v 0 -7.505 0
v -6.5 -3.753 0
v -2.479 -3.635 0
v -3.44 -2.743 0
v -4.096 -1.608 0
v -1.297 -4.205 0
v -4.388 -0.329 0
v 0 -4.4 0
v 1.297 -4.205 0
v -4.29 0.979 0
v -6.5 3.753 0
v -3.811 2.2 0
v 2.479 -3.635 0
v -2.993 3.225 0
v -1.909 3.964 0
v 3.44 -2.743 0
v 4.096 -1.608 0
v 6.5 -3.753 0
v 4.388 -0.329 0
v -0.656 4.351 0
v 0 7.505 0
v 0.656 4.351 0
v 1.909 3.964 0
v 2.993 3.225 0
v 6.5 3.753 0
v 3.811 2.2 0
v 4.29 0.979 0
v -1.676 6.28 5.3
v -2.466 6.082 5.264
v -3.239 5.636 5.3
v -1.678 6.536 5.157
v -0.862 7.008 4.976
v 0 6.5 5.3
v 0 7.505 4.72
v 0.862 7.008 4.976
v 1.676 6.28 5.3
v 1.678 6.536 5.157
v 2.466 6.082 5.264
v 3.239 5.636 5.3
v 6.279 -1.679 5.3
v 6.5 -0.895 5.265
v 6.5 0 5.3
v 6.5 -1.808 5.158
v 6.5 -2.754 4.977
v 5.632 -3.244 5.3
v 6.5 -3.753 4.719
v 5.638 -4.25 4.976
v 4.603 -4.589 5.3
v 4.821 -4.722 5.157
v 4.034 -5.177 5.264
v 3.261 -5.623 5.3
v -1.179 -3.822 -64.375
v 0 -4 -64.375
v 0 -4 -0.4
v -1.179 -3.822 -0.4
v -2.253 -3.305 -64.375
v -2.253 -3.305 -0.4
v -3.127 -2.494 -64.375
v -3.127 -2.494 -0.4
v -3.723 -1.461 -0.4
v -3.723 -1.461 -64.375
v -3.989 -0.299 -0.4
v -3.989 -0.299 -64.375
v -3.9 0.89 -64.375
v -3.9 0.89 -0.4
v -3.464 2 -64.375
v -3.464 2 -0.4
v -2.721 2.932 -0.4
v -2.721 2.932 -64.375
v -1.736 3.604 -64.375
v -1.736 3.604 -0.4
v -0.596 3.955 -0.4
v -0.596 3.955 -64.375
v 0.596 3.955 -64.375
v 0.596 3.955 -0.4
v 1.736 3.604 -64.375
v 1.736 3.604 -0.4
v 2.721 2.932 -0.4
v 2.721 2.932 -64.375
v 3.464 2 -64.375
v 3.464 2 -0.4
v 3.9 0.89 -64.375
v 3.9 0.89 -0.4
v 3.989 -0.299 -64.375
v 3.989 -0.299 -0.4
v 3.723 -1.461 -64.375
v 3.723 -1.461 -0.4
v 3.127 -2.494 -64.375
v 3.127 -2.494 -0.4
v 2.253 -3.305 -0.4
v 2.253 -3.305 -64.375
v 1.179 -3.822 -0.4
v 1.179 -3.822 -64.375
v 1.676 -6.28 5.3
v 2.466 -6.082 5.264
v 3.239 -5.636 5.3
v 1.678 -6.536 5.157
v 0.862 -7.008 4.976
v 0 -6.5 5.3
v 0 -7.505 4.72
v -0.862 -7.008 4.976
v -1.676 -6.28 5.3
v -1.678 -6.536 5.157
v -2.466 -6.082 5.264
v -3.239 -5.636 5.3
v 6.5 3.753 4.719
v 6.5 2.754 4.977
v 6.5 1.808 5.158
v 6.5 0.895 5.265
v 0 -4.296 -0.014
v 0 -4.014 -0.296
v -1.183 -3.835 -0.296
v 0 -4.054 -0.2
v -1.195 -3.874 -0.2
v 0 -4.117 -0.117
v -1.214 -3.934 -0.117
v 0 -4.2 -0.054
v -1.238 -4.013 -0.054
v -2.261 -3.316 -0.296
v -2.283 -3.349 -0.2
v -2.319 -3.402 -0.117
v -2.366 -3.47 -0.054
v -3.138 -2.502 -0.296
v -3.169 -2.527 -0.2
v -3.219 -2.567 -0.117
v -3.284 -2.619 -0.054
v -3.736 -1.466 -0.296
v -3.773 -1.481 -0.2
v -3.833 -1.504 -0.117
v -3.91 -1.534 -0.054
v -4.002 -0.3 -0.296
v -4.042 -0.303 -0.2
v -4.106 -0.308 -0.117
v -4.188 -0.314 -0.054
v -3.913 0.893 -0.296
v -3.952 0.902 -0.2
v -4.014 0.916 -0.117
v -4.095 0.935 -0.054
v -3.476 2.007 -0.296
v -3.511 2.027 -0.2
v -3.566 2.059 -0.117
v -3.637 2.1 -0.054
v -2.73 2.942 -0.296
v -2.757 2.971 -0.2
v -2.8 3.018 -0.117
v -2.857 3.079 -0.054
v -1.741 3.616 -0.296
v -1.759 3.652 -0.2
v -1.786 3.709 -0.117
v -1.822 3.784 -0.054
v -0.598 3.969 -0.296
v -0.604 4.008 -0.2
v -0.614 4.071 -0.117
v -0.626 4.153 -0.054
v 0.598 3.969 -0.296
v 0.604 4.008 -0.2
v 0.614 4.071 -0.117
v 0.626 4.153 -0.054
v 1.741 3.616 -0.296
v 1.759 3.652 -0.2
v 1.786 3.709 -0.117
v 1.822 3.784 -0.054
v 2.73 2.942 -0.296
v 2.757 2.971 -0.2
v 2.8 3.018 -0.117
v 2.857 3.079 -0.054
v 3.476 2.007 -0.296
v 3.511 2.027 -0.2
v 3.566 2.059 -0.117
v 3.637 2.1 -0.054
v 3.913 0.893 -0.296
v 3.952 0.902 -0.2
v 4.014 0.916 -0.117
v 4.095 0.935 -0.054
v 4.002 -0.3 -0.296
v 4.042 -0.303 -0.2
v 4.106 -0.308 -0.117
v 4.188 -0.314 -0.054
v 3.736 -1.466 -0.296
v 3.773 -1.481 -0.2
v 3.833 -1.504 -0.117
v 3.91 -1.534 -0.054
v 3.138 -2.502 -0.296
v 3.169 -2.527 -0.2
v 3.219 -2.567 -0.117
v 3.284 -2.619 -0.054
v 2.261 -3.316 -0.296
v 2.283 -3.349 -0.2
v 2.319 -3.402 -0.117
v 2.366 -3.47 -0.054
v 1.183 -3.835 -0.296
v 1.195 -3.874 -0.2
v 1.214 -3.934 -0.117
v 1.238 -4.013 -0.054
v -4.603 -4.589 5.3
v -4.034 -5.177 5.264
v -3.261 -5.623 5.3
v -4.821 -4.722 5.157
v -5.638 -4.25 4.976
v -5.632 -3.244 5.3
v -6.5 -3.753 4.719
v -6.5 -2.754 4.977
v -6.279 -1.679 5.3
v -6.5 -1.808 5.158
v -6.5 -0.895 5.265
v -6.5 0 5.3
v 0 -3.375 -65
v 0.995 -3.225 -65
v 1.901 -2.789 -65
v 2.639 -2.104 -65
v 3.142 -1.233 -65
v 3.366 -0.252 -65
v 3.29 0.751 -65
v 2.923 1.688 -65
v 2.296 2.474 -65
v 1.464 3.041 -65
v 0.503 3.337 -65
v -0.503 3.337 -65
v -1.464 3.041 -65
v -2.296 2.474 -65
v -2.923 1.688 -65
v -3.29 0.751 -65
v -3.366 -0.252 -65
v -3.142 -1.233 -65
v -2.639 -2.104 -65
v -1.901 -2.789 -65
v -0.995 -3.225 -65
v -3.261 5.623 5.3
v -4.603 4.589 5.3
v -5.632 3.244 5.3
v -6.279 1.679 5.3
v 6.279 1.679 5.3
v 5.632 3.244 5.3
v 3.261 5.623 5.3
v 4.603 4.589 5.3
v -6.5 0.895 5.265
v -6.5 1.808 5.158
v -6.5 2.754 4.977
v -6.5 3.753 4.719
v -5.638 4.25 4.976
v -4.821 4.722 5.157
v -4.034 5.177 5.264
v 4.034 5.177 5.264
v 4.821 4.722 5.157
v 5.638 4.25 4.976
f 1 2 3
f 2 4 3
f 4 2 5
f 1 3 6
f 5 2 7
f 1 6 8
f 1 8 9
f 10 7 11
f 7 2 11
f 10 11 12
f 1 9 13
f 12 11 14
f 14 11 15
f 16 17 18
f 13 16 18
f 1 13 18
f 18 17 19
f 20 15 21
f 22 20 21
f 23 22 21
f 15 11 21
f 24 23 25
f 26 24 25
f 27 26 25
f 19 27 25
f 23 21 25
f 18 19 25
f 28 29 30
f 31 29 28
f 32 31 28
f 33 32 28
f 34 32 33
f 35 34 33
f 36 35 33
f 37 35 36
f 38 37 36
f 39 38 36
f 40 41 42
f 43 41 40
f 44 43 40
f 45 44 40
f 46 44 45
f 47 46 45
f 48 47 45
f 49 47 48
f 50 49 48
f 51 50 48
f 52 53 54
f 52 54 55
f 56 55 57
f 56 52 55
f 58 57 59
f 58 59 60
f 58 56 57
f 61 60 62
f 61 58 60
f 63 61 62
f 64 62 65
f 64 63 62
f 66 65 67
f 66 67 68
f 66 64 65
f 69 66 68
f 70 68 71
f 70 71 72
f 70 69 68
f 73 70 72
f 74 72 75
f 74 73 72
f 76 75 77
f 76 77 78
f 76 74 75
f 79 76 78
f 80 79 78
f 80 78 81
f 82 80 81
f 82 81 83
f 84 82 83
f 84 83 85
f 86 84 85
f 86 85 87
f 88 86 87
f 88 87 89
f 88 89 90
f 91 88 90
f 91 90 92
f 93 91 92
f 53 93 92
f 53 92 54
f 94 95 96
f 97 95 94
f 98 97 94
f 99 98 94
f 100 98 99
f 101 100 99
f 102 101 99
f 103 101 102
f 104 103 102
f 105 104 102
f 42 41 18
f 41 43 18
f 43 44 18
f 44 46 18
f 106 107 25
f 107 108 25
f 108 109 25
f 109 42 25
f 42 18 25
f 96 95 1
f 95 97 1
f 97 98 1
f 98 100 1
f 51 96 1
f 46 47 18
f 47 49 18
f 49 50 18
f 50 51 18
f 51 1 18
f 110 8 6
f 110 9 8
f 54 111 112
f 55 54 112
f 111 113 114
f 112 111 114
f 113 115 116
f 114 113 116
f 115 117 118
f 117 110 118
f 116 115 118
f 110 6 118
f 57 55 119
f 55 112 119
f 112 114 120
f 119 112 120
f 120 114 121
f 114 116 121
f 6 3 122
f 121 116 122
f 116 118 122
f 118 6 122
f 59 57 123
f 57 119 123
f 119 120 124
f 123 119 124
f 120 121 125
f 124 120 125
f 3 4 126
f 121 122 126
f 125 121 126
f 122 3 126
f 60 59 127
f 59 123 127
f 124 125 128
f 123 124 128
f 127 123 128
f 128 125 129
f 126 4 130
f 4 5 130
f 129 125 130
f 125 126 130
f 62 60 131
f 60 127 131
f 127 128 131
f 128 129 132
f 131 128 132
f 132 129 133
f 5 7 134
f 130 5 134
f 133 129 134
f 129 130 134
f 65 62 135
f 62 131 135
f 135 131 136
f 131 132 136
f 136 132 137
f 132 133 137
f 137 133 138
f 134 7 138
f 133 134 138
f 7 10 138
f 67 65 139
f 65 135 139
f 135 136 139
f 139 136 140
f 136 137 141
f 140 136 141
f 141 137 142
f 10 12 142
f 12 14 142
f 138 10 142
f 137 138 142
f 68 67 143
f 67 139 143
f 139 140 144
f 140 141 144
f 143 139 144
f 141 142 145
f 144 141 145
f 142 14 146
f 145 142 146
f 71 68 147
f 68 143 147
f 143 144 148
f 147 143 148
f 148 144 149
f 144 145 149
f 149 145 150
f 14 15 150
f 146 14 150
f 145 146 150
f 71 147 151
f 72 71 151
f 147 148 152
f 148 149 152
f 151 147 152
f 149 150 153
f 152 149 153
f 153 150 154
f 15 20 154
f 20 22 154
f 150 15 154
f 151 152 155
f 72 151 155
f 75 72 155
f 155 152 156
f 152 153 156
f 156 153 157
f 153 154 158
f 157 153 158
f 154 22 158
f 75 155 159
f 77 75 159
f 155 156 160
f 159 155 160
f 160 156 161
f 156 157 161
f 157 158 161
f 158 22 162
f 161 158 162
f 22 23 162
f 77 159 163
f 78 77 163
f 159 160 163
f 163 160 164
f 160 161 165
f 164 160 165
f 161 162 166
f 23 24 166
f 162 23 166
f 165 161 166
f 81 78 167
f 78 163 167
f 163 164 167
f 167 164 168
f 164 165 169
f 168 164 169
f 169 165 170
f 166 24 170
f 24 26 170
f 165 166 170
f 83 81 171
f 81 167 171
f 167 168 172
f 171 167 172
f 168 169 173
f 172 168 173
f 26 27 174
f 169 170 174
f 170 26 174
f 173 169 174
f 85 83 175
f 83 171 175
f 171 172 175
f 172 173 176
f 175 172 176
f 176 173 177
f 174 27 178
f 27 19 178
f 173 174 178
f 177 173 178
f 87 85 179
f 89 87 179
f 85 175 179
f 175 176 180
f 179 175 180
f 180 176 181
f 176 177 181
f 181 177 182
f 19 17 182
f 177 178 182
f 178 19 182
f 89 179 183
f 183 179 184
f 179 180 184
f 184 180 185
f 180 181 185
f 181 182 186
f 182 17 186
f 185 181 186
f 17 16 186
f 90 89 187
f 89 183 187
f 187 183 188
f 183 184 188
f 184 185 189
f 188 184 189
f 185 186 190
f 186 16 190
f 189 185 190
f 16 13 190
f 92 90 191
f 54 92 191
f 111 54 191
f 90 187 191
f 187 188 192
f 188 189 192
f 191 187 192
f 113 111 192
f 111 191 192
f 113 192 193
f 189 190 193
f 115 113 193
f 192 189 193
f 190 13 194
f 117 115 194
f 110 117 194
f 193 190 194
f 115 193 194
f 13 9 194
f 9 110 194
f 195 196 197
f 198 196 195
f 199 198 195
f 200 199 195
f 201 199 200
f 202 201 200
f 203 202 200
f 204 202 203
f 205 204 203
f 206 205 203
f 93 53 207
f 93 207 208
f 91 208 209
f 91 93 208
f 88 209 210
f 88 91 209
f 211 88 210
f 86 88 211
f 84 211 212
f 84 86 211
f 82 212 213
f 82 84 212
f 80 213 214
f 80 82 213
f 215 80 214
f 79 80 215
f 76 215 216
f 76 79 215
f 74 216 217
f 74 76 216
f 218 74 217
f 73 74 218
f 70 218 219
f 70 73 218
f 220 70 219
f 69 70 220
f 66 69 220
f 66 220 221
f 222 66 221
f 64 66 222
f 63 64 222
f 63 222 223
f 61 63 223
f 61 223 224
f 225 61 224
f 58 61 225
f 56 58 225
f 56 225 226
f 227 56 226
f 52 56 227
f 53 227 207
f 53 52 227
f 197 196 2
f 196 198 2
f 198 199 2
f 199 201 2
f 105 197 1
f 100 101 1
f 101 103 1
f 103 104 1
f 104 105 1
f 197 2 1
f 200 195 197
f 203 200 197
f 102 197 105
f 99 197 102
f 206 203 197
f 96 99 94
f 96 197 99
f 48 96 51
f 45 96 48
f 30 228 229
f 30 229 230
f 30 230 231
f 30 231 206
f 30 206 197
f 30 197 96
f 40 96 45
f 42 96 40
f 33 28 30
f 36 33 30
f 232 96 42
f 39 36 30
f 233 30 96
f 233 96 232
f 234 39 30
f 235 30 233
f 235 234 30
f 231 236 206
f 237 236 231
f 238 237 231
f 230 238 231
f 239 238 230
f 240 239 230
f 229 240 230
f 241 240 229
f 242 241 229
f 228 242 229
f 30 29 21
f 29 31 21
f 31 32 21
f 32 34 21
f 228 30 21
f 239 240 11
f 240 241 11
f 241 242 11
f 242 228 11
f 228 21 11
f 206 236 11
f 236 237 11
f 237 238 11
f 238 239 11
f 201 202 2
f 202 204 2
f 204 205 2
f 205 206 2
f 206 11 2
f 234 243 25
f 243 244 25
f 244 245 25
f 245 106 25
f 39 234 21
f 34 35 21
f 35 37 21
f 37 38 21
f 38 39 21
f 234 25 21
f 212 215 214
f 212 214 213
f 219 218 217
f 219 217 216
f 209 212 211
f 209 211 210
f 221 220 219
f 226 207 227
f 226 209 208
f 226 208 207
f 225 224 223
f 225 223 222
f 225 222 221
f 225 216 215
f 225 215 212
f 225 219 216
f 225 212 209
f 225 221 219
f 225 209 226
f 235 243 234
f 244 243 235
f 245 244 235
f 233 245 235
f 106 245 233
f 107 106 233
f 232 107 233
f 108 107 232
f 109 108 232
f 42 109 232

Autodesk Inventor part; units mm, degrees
ref_plane "WorkPlane1" through (0, 0, 0) normal (0, 0, 1) x (1, 0, 0)
sketch "Szkic1" plane through (0, 0, 0) normal (0, 0, 1) x (1, 0, 0)
  point P0 (0, 0)
sketch "Szkic2" plane through (0, 0, 0) normal (0, 0, 1) x (1, 0, 0)
  line L0 (-6.5, 3.7529) -> (-6.5, -3.7529)
  line L1 (0, 7.5054) -> (-6.5, 3.7529)
  line L2 (6.5, 3.7529) -> (0, 7.5054)
  line L3 (6.5, -3.7529) -> (6.5, 3.7529)
  line L4 (0, -7.5054) -> (6.5, -3.7529)
  line L5 (-6.5, -3.7529) -> (0, -7.5054)
  circle A0 centre (0, 0) radius 6.5 construction
  dimension "d1" = 13
  dimension "d29" = 0
  dimension "d30" = 0
extrude "Wyciągnięcie proste1" add sketch "Szkic2" along normal blind 5.3
sketch "Szkic3" plane through (0, 0, 0) normal (1, 0, 0) x (0, 1, 0)
  line L0 (6.5, 5.3) -> (7.6054, 5.3)
  line L1 (7.6054, 4.6618) -> (6.5, 5.3)
  line L2 (7.6054, 5.3) -> (7.6054, 4.6618)
  line L3 (0, -1.06) -> (0, 6.36) projected
  line L4 (7.5054, 0) -> (7.5054, 5.3) projected
  dimension "d25" = 0.1
  dimension "d26" = 0
  dimension "d27" = 60
  dimension "d28" = 6.5
revolve "Obrót1" cut sketch "Szkic3" angle 360 about axis through (0, 0, -10) along (0, 0, 1)
sketch "Szkic4" plane through (0, 0, 0) normal (1, 0, 0) x (0, 1, 0)
  line L0 (0, -65) -> (0, 0)
  line L1 (-4, -65) -> (0, -65)
  line L2 (-4, 0) -> (-4, -65)
  line L3 (0, 0) -> (-4, 0)
  line L4 (0, -65) -> (0, 0)
  line L5 (-4.8, 0) -> (0.8, 0) projected
  line L6 (0, -78) -> (0, 13) projected
  dimension "d18" = 4
  dimension "d20" = 65
  dimension "d33" = 0
  dimension "d34" = 0
revolve "Obrót2" add sketch "Szkic4" angle 360 about axis through (0, 0, -65) along (0, 0, -1)
chamfer "Faza1" distance 0.625 angle 45 1 edges at (0, 4, -65)
fillet "Zaokrąglenie1" radius 0.4 1 edges at (0, 4, 0)
thread "Gwint1" size "M8x1.25" class "6g" standard "ISO Metric profile" length 22
ref_plane "MSC_PF1" through (0, 0, 0) normal (1, 0, 0) x (0, 1, 0)
ref_plane "MSC_PT1" through (0, 0, 0) normal (0, 0, -1) x (-1, 0, 0)
equation "\"d1\" = ParS"
equation "\"d6\" = ParK"
equation "\"d22\" = 0.5 * PTC"
equation "\"d23\" = 0.5 * PTC"
equation "\"d24\" = r"
equation "\"d28\" = 0.5 * ParS"
equation "\"d18\" = 0.5 * NND"
equation "\"d20\" = NLG"
equation "\"NND\" = 8"
equation "\"NLG\" = 65"
equation "\"PTC\" = 1.25"
equation "\"ParK\" = 5.3"
equation "\"ParS\" = 13"
equation "\"msp_es\" = 0.577367 * ParS"
equation "\"r\" = 0.4"
equation "\"THREADDIA\" = NND"
properties part number "ISO 4016 - M8 x 65" material "Stal"
